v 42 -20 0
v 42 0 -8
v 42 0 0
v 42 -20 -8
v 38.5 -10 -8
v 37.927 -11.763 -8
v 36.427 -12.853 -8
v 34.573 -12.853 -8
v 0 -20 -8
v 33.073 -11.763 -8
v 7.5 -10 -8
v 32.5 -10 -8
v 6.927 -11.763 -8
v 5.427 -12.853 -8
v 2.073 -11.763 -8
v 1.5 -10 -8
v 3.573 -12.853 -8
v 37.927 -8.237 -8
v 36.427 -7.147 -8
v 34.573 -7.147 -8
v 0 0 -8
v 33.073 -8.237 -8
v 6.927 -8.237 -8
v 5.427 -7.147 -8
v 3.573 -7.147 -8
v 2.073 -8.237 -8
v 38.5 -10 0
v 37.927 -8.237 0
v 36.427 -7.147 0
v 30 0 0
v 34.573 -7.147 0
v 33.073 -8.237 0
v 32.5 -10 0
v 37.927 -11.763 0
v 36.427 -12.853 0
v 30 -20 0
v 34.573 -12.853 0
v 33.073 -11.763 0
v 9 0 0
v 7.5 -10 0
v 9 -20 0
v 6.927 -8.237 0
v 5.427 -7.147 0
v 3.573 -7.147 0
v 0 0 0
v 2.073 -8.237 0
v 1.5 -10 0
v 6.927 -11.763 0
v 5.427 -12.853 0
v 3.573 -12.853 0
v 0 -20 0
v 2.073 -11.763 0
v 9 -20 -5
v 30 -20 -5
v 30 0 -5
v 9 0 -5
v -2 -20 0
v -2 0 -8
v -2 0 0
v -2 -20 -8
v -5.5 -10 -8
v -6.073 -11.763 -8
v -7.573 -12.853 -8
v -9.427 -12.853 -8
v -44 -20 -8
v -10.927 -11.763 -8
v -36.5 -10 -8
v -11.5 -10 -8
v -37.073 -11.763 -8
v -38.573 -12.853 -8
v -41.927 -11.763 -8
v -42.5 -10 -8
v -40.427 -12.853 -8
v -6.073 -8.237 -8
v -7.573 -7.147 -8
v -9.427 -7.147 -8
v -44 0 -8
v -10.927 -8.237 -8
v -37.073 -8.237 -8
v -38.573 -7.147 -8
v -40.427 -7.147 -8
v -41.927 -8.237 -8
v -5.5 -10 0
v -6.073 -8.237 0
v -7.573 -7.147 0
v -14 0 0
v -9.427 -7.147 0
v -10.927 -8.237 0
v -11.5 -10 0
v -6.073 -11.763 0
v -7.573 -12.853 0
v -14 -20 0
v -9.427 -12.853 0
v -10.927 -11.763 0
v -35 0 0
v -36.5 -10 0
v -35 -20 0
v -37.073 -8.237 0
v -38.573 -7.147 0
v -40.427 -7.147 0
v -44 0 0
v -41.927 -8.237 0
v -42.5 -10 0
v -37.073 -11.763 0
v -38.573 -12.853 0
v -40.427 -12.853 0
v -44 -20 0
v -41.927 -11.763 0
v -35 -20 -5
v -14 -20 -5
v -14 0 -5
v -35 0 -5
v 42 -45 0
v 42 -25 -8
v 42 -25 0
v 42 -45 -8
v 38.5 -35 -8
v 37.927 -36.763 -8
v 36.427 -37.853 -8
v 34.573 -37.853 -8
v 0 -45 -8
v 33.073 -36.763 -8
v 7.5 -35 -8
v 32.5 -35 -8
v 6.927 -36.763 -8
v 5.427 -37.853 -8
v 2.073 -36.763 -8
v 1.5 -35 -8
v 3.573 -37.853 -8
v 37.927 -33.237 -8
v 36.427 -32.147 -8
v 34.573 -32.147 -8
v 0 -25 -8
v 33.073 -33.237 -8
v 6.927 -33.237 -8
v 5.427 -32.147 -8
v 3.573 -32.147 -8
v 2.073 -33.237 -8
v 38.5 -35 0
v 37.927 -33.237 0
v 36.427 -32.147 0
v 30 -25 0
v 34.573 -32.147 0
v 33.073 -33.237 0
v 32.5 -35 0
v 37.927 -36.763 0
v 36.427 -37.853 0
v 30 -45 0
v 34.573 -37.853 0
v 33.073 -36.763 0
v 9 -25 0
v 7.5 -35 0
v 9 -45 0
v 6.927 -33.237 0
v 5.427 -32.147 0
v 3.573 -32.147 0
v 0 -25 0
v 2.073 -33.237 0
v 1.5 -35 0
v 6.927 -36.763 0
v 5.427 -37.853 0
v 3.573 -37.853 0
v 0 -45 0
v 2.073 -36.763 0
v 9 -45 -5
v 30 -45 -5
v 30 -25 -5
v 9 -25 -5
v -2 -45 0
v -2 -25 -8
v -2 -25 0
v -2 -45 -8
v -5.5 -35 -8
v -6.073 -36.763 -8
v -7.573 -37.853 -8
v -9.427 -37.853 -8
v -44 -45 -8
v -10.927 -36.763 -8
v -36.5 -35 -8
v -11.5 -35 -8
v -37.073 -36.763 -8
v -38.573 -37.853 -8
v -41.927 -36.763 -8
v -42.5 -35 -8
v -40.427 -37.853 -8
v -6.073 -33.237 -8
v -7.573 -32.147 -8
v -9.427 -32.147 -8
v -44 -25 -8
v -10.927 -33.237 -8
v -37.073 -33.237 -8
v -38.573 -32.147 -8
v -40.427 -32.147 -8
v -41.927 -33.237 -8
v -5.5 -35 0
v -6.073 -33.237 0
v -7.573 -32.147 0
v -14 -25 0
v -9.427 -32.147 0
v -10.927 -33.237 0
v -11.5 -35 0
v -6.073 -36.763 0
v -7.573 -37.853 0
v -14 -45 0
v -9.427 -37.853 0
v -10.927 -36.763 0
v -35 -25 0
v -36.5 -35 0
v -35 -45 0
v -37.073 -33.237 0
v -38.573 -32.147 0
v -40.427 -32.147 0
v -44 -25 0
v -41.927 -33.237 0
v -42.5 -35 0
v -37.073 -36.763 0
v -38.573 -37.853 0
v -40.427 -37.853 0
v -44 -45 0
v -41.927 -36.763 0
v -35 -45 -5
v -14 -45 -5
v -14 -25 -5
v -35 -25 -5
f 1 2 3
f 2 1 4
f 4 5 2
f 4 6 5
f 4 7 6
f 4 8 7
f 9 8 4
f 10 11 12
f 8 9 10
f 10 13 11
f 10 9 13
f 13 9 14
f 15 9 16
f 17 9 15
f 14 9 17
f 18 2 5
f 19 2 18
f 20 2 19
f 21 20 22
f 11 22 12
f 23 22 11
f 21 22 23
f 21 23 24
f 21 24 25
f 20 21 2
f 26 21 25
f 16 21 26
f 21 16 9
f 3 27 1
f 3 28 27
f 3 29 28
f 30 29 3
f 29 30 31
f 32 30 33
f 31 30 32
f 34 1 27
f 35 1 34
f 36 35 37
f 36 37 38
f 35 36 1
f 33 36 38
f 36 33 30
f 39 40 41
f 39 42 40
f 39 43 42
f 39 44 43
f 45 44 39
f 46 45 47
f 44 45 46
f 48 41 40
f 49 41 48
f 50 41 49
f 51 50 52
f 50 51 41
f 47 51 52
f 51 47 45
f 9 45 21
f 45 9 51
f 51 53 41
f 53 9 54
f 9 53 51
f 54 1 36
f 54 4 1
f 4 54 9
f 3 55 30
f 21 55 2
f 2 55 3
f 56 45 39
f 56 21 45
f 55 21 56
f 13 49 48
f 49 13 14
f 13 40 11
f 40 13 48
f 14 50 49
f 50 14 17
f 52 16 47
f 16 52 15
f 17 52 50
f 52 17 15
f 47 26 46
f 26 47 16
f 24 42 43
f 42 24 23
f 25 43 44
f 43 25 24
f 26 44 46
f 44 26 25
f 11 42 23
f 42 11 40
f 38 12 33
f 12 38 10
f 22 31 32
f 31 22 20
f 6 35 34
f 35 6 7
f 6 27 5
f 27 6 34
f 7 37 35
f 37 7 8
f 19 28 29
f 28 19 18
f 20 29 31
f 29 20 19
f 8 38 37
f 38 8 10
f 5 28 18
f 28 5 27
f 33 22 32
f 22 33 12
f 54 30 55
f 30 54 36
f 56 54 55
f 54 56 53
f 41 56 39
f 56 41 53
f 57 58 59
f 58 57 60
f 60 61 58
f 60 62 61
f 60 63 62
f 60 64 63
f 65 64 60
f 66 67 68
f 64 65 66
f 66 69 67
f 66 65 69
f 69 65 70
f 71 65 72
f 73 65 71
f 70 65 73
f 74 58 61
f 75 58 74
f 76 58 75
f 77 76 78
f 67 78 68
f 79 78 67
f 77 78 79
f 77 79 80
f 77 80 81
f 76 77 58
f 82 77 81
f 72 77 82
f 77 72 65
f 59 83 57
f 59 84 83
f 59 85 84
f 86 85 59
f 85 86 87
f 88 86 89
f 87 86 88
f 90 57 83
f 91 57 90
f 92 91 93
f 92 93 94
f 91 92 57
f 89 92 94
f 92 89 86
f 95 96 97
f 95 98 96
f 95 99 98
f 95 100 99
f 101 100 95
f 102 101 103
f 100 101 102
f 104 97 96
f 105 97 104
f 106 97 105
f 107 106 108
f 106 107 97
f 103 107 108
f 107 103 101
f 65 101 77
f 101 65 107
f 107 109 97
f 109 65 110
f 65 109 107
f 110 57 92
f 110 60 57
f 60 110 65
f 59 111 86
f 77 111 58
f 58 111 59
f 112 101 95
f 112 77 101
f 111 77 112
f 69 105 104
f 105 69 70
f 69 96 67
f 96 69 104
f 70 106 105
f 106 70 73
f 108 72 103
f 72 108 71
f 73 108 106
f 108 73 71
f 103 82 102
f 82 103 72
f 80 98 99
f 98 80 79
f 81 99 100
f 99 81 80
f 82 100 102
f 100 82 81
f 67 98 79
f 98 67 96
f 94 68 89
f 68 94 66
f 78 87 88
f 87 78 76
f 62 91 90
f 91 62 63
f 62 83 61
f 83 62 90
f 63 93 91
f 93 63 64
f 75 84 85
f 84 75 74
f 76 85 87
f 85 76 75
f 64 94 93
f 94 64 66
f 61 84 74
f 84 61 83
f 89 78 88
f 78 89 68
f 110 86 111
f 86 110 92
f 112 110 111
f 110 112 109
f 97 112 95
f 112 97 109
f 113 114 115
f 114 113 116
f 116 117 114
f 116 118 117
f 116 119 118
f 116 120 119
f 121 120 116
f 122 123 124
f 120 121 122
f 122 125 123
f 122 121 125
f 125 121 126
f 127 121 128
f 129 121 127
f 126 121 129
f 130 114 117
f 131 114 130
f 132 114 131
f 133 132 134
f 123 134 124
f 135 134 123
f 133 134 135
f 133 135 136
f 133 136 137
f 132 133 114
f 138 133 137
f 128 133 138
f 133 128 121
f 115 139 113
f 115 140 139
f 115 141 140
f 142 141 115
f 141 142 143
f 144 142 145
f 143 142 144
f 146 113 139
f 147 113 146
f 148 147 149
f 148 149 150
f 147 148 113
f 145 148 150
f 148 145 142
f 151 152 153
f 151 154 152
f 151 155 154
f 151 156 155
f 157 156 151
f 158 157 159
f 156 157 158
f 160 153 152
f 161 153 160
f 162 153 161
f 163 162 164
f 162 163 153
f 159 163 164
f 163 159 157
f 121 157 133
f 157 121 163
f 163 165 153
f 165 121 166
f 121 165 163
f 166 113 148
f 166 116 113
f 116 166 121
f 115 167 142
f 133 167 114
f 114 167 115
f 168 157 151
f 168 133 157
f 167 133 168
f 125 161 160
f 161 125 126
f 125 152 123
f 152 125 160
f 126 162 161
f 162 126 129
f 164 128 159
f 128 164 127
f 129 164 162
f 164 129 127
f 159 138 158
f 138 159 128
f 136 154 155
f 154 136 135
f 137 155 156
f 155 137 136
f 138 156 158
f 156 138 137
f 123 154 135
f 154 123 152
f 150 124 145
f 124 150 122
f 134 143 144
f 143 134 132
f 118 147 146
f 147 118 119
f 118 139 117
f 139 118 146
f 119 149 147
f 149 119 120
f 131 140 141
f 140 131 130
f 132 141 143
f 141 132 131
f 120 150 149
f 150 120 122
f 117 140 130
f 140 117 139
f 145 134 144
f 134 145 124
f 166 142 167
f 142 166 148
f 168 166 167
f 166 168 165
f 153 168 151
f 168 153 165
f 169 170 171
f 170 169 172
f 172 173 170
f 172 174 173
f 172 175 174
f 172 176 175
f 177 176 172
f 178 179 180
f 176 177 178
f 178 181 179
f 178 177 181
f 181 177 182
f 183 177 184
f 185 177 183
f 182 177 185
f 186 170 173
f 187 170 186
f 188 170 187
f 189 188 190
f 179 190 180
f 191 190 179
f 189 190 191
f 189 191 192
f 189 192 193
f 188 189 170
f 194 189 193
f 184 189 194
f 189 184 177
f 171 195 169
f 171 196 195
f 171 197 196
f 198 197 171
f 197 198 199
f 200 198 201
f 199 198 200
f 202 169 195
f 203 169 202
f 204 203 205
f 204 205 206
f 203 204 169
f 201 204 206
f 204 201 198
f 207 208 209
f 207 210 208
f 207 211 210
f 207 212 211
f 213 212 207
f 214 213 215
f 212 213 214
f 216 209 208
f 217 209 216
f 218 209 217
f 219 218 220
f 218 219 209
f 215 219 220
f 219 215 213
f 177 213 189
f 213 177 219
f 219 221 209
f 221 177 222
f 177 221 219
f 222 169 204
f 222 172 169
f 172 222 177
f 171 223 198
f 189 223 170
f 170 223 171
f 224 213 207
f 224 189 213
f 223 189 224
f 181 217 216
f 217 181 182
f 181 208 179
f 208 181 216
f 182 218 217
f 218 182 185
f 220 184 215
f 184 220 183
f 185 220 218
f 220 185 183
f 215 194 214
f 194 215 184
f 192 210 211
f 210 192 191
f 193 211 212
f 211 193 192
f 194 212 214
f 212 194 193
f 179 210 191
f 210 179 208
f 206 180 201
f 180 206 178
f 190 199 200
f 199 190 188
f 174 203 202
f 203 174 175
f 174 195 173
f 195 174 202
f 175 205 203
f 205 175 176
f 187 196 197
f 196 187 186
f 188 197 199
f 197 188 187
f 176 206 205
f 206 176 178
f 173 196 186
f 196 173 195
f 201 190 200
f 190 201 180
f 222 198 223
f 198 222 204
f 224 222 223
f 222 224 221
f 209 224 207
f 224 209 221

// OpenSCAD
module ConnectorTwo (){

difference() {
    
    //Base     X, Y, Z               X, Y, Z
    translate([0, 0, 0])cube(size = [42,20,8]);
    
    //Hole1    X,  Y,  Z
    translate([4.5, 10, 0])cylinder(h = 40, r = 3);
    
    //Hole2    X,  Y,  Z
    translate([35.5, 10, 0])cylinder(h = 40, r = 3);
    
    //Cube    X,  Y,  Z
    translate([9, 0, 0]) cube(size = [21,20,5]);
    
    
}

}

rotate([180, 0, 0]){

//         X, Y, Z
translate([0, 0, 0])ConnectorTwo();

translate([-44, 0, 0])ConnectorTwo();

translate([0, 25, 0])ConnectorTwo();

translate([-44, 25, 0])ConnectorTwo();
}


//http://blog.cubehero.com/2013/11/19/know-only-10-things-to-be-dangerous-in-openscad/

//https://en.wikibooks.org/wiki/OpenSCAD_User_Manual/Modules
